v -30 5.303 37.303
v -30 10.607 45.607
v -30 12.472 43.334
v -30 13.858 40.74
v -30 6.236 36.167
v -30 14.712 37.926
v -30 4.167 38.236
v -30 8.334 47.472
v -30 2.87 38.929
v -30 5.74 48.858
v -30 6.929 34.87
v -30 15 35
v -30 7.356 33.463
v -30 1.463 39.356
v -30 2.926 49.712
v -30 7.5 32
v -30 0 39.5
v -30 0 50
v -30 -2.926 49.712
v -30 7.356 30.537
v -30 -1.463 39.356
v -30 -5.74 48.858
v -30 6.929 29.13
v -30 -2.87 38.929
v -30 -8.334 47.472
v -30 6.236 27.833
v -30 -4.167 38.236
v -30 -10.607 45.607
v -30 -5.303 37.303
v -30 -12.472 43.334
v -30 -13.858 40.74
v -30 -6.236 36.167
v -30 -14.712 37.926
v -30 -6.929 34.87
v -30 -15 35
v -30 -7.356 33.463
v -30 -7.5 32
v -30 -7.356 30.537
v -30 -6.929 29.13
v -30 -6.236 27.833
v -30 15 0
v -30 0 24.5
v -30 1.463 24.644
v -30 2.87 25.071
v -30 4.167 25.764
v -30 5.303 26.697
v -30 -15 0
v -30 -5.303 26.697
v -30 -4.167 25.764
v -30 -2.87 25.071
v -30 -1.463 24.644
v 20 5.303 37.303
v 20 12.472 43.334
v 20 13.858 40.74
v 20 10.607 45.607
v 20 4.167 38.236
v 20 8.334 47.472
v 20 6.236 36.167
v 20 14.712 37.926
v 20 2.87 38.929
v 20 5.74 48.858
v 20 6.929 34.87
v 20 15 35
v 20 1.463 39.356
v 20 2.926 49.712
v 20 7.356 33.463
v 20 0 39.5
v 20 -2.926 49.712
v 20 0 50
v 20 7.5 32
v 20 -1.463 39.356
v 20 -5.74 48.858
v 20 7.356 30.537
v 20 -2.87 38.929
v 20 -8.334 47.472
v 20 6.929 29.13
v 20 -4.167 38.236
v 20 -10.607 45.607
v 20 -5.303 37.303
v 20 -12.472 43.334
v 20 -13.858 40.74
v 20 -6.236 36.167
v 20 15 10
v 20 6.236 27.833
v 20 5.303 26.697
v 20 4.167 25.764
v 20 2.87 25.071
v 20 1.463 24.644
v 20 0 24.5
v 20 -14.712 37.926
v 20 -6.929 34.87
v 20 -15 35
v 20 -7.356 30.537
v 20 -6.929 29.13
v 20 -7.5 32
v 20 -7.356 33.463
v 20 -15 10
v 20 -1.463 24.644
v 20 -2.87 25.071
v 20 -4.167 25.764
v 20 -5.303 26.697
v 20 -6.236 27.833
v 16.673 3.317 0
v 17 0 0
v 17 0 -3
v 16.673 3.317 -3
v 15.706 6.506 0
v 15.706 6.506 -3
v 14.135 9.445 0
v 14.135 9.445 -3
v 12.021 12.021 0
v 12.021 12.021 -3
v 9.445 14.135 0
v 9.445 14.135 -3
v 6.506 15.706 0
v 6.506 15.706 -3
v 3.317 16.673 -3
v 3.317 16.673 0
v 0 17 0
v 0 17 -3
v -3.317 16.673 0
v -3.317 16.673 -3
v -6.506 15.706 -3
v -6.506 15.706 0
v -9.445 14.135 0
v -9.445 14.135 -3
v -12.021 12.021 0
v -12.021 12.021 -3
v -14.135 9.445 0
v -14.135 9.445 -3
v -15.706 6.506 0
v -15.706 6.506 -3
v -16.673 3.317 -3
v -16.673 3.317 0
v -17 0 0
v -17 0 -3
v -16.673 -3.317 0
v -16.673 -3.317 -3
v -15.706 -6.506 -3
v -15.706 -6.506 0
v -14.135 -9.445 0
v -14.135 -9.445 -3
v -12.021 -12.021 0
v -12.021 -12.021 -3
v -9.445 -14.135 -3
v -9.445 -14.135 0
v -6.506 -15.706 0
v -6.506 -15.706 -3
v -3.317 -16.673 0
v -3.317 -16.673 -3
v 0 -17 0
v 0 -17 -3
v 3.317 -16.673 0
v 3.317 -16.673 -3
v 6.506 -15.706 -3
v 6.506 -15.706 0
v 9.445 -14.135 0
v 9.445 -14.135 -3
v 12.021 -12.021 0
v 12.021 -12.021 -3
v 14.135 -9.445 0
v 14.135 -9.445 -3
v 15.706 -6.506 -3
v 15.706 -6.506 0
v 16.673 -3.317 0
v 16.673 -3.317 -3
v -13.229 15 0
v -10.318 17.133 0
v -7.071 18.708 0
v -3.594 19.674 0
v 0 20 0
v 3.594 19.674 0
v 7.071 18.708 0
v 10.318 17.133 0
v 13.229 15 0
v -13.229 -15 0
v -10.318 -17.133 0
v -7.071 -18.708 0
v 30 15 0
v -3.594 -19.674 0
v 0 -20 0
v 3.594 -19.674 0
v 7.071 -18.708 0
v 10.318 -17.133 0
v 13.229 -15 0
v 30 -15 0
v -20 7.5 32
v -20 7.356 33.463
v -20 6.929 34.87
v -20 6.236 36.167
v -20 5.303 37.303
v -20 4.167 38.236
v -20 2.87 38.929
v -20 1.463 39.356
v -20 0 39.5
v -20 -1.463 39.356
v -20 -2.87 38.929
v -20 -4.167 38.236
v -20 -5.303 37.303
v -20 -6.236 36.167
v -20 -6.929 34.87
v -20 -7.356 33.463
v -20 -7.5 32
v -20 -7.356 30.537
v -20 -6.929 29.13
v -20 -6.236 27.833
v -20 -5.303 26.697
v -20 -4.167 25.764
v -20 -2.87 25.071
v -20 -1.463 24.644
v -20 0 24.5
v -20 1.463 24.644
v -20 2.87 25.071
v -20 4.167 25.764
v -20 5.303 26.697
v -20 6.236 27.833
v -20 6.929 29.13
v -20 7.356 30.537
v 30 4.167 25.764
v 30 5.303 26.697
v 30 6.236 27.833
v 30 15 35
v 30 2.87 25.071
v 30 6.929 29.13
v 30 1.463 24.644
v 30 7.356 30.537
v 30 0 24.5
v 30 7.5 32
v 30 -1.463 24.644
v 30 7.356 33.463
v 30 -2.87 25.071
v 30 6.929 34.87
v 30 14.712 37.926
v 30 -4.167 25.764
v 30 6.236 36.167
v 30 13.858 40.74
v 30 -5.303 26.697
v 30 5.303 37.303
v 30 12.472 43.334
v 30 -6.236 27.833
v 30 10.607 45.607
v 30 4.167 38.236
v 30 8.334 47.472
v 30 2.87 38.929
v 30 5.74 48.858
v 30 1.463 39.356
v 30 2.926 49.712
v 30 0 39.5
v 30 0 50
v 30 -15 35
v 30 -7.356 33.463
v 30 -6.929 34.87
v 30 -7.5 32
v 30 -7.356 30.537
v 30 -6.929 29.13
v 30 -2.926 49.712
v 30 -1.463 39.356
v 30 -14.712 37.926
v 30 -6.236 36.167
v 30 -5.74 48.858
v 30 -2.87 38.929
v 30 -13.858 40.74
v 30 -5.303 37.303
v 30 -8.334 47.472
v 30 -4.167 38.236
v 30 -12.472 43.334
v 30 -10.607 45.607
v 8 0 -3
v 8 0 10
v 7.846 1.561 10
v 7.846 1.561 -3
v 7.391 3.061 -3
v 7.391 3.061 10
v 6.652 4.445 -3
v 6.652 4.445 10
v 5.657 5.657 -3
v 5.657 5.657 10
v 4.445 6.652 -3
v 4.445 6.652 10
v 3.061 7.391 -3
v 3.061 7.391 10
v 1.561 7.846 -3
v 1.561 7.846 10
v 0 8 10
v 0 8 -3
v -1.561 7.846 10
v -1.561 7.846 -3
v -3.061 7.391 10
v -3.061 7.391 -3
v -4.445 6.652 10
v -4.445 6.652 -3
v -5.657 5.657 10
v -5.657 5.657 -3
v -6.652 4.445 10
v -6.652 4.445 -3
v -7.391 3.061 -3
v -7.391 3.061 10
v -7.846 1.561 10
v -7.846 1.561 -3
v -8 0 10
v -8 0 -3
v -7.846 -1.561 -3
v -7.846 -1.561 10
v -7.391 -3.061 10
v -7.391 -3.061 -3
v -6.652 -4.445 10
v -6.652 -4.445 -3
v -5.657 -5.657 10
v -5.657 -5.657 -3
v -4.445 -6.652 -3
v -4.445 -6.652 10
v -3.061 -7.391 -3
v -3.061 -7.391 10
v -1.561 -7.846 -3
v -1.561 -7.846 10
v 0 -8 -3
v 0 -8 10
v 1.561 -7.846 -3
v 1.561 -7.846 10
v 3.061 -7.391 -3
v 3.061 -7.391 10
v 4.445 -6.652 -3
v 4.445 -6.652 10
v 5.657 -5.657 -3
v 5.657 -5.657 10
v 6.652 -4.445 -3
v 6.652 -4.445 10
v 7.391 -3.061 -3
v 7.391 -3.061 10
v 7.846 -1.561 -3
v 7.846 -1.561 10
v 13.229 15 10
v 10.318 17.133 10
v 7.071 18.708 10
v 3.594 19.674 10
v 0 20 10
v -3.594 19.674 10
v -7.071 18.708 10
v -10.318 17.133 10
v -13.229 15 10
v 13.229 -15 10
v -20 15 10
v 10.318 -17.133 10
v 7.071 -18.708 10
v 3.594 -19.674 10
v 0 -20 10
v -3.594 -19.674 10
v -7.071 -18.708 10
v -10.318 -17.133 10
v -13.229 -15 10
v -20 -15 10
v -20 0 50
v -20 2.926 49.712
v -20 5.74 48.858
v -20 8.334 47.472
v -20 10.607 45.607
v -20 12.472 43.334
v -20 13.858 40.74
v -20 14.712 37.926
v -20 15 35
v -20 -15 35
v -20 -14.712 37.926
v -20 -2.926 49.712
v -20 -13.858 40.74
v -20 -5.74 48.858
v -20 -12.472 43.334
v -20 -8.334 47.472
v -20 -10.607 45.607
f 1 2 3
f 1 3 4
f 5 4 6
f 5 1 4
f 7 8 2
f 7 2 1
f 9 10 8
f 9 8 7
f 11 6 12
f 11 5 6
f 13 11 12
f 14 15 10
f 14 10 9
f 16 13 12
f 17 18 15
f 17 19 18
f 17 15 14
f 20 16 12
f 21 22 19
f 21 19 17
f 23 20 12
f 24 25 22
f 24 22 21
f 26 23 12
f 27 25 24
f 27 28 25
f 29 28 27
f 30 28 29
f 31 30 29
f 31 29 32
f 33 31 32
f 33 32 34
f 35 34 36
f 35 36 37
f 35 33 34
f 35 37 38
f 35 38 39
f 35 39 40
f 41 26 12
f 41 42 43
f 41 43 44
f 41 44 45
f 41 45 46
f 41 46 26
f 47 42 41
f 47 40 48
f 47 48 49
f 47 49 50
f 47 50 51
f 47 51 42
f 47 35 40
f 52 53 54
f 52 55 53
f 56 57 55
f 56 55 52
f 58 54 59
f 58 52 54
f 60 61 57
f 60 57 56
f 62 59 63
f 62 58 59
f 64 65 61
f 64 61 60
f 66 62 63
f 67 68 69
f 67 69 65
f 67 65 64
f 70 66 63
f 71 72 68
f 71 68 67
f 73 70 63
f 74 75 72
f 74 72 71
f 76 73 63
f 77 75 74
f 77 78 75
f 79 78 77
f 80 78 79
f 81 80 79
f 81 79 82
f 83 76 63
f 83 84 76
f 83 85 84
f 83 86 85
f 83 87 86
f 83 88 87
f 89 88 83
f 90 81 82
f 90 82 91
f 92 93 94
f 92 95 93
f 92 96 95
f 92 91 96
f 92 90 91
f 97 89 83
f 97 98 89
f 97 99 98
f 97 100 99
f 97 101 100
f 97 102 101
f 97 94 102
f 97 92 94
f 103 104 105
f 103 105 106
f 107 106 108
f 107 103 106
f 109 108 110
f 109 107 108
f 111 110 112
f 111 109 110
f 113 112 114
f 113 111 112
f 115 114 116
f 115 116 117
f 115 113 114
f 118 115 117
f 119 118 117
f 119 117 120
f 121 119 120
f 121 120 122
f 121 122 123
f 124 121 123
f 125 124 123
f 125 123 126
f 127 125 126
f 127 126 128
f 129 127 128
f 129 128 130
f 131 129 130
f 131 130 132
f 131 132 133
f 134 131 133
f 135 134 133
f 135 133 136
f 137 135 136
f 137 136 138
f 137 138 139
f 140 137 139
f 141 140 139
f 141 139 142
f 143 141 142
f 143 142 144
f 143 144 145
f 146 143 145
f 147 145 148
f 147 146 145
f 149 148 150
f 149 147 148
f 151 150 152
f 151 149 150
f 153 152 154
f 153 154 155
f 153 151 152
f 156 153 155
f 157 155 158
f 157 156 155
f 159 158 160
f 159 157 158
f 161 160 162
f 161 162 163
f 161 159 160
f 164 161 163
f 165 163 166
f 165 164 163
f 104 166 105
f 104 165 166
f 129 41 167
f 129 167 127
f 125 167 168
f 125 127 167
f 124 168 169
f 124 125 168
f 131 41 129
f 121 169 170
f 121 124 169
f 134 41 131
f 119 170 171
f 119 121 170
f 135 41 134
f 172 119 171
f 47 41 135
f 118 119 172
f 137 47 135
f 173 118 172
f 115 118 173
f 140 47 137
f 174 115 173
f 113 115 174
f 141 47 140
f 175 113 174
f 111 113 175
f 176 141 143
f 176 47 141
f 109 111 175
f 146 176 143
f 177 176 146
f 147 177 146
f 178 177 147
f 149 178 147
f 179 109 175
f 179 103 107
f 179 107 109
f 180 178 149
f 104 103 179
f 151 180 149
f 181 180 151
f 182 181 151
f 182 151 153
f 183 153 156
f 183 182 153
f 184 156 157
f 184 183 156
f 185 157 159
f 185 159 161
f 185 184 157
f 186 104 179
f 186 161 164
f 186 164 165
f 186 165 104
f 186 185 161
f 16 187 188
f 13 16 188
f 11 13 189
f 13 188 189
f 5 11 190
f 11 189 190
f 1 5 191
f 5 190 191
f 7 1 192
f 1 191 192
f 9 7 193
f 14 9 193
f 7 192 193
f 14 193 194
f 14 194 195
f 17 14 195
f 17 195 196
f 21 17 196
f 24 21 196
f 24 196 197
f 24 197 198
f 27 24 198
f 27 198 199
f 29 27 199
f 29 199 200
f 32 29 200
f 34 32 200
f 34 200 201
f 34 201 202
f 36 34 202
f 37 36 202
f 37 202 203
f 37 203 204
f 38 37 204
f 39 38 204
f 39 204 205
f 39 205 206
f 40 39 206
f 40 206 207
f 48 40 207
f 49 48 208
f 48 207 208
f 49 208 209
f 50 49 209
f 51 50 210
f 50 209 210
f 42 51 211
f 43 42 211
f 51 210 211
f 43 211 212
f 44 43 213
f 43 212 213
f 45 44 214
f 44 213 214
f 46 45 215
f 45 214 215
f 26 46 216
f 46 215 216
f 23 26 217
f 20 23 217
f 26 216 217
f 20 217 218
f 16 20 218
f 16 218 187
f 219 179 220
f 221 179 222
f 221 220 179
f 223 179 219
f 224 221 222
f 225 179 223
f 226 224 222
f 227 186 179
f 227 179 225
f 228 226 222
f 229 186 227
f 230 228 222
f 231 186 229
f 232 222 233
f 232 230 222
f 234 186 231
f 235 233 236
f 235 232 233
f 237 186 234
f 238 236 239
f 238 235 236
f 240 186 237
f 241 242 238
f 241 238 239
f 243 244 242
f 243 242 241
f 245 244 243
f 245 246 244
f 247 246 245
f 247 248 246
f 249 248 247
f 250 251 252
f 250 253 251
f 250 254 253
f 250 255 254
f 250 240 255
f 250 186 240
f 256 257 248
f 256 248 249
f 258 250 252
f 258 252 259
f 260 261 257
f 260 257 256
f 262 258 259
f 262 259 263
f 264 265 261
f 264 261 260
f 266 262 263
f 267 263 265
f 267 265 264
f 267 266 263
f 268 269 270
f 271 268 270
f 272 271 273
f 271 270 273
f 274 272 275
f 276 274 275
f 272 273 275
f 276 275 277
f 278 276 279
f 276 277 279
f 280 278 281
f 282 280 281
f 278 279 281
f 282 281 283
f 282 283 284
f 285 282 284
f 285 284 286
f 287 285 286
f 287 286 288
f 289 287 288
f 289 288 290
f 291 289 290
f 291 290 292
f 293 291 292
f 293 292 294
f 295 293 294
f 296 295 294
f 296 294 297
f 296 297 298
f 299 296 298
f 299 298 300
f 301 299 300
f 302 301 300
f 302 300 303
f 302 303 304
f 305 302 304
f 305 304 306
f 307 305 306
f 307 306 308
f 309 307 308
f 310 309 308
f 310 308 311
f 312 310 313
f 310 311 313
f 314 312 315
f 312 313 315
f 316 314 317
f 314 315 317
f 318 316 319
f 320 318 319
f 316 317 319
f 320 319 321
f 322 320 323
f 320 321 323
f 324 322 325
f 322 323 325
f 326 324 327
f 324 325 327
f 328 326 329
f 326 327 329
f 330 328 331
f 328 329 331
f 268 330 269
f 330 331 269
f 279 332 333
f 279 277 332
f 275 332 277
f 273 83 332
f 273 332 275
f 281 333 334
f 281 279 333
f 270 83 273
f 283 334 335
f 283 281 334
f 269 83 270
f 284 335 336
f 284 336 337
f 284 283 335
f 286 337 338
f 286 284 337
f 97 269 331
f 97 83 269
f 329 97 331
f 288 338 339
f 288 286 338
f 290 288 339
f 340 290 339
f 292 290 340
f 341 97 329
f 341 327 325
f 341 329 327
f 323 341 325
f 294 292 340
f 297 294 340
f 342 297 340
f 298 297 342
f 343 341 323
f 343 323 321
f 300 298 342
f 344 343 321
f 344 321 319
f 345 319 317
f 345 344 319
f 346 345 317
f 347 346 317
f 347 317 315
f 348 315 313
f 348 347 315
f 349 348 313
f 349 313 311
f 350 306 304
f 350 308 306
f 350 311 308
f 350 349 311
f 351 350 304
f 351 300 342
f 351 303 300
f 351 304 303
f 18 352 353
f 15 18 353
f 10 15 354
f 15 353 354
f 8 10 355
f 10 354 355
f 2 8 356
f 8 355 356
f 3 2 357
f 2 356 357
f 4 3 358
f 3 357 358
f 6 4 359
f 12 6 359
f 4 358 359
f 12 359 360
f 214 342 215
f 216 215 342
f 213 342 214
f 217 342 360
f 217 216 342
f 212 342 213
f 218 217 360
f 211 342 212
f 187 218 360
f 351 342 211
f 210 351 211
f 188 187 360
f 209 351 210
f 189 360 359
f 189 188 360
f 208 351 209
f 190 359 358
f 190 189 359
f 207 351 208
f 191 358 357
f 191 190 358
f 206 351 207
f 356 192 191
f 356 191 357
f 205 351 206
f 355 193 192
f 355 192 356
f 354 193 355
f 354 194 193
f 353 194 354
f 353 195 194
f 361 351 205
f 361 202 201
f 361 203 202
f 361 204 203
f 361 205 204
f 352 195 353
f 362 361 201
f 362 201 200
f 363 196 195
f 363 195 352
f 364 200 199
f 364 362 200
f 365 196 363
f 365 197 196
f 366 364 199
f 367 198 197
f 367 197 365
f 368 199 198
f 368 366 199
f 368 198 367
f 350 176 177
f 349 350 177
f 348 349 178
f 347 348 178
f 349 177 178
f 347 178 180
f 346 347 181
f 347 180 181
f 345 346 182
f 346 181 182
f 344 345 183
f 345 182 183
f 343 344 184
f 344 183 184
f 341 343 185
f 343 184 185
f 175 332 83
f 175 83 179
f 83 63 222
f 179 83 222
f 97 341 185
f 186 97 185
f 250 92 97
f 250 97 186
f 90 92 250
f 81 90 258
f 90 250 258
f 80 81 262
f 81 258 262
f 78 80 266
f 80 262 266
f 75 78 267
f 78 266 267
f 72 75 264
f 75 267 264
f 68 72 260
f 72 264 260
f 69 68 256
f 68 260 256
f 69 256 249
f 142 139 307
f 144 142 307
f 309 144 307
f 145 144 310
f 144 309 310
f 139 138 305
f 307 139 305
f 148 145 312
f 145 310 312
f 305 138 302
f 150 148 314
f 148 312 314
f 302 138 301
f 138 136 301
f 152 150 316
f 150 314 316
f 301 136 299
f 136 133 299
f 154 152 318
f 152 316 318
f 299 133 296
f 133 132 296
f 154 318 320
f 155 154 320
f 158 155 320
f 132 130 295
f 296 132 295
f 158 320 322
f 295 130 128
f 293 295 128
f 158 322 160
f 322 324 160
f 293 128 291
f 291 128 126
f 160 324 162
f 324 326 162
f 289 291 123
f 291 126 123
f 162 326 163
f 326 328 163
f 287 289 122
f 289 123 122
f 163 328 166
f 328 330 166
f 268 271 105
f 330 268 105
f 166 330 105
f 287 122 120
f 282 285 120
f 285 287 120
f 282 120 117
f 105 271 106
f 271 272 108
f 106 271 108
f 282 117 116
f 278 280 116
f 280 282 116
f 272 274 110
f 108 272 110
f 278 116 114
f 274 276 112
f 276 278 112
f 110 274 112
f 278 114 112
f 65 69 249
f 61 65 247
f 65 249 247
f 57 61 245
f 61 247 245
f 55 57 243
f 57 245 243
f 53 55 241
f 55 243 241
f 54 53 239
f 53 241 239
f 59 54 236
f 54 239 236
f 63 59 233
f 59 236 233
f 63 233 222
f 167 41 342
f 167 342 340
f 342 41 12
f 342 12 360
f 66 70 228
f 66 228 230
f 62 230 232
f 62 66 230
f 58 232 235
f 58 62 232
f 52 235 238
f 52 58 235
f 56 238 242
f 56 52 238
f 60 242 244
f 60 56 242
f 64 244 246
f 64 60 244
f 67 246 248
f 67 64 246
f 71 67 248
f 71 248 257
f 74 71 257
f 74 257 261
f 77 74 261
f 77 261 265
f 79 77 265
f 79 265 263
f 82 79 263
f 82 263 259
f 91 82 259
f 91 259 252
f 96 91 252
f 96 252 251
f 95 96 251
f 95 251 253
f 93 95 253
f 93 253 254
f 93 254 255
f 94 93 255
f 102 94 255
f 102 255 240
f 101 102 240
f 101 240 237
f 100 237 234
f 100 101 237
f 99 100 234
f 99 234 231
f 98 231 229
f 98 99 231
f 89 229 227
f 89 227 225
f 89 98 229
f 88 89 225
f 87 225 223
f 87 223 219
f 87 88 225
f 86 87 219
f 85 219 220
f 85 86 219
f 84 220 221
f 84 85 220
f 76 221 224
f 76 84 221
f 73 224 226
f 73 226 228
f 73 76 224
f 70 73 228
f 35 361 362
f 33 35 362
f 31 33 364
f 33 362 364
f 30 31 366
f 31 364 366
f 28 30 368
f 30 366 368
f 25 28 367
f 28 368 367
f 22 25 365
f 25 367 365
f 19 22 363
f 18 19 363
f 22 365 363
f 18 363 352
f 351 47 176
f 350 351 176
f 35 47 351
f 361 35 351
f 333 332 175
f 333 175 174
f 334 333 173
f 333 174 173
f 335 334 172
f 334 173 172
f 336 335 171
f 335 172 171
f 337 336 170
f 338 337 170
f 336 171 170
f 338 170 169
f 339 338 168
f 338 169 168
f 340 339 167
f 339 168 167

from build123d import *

# Parameters (mm, degrees)
F0_R     = 20
F0_R_2   = 8
F1_DEPTH = 10
F2_R     = 17
F2_R_2   = 8
F3_DEPTH = 3
F5_DEPTH = 15
F6_R     = 8
F7_DEPTH = 25
F8_R     = 7.5
F9_DEPTH = 30


with BuildPart() as f1:
    # F0 (on Top) → F1 (new body)
    with BuildSketch(Plane.XY):
        Circle(F0_R)
        Circle(F0_R_2, mode=Mode.SUBTRACT)
    extrude(amount=F1_DEPTH)

    # F2 (on Top) → F3 (join)
    with BuildSketch(Plane.XY):
        Circle(F2_R)
        Circle(F2_R_2, mode=Mode.SUBTRACT)
    extrude(amount=-F3_DEPTH)

    # F4 (on Front) → F5 (join, symmetric)
    with BuildSketch(Plane.XZ):
        Polygon((-30, 50), (-30, 0), (30, 0), (30, 50), (20, 50), (20, 10), (-20, 10), (-20, 50), align=None)
    extrude(amount=F5_DEPTH, both=True)

    # F6 (on face) → F7 (cut)
    with BuildSketch(Plane.XY.offset(10)):
        Circle(F6_R)
    extrude(amount=-F7_DEPTH, mode=Mode.SUBTRACT)

    # F8 (on Right) → F9 (cut, symmetric)
    with BuildSketch(Plane.YZ):
        with Locations((0, 32)):
            Circle(F8_R)
        with BuildLine():
            ThreePointArc((-15, 35), (-10.606602, 45.606602), (0, 50))
            Line((0, 50), (-15, 50))
            Line((-15, 50), (-15, 35))
        make_face()
        with BuildLine():
            ThreePointArc((0, 50), (10.606602, 45.606602), (15, 35))
            Line((15, 35), (15, 50))
            Line((15, 50), (0, 50))
        make_face()
    extrude(amount=F9_DEPTH, both=True, mode=Mode.SUBTRACT)


solid = f1.part
